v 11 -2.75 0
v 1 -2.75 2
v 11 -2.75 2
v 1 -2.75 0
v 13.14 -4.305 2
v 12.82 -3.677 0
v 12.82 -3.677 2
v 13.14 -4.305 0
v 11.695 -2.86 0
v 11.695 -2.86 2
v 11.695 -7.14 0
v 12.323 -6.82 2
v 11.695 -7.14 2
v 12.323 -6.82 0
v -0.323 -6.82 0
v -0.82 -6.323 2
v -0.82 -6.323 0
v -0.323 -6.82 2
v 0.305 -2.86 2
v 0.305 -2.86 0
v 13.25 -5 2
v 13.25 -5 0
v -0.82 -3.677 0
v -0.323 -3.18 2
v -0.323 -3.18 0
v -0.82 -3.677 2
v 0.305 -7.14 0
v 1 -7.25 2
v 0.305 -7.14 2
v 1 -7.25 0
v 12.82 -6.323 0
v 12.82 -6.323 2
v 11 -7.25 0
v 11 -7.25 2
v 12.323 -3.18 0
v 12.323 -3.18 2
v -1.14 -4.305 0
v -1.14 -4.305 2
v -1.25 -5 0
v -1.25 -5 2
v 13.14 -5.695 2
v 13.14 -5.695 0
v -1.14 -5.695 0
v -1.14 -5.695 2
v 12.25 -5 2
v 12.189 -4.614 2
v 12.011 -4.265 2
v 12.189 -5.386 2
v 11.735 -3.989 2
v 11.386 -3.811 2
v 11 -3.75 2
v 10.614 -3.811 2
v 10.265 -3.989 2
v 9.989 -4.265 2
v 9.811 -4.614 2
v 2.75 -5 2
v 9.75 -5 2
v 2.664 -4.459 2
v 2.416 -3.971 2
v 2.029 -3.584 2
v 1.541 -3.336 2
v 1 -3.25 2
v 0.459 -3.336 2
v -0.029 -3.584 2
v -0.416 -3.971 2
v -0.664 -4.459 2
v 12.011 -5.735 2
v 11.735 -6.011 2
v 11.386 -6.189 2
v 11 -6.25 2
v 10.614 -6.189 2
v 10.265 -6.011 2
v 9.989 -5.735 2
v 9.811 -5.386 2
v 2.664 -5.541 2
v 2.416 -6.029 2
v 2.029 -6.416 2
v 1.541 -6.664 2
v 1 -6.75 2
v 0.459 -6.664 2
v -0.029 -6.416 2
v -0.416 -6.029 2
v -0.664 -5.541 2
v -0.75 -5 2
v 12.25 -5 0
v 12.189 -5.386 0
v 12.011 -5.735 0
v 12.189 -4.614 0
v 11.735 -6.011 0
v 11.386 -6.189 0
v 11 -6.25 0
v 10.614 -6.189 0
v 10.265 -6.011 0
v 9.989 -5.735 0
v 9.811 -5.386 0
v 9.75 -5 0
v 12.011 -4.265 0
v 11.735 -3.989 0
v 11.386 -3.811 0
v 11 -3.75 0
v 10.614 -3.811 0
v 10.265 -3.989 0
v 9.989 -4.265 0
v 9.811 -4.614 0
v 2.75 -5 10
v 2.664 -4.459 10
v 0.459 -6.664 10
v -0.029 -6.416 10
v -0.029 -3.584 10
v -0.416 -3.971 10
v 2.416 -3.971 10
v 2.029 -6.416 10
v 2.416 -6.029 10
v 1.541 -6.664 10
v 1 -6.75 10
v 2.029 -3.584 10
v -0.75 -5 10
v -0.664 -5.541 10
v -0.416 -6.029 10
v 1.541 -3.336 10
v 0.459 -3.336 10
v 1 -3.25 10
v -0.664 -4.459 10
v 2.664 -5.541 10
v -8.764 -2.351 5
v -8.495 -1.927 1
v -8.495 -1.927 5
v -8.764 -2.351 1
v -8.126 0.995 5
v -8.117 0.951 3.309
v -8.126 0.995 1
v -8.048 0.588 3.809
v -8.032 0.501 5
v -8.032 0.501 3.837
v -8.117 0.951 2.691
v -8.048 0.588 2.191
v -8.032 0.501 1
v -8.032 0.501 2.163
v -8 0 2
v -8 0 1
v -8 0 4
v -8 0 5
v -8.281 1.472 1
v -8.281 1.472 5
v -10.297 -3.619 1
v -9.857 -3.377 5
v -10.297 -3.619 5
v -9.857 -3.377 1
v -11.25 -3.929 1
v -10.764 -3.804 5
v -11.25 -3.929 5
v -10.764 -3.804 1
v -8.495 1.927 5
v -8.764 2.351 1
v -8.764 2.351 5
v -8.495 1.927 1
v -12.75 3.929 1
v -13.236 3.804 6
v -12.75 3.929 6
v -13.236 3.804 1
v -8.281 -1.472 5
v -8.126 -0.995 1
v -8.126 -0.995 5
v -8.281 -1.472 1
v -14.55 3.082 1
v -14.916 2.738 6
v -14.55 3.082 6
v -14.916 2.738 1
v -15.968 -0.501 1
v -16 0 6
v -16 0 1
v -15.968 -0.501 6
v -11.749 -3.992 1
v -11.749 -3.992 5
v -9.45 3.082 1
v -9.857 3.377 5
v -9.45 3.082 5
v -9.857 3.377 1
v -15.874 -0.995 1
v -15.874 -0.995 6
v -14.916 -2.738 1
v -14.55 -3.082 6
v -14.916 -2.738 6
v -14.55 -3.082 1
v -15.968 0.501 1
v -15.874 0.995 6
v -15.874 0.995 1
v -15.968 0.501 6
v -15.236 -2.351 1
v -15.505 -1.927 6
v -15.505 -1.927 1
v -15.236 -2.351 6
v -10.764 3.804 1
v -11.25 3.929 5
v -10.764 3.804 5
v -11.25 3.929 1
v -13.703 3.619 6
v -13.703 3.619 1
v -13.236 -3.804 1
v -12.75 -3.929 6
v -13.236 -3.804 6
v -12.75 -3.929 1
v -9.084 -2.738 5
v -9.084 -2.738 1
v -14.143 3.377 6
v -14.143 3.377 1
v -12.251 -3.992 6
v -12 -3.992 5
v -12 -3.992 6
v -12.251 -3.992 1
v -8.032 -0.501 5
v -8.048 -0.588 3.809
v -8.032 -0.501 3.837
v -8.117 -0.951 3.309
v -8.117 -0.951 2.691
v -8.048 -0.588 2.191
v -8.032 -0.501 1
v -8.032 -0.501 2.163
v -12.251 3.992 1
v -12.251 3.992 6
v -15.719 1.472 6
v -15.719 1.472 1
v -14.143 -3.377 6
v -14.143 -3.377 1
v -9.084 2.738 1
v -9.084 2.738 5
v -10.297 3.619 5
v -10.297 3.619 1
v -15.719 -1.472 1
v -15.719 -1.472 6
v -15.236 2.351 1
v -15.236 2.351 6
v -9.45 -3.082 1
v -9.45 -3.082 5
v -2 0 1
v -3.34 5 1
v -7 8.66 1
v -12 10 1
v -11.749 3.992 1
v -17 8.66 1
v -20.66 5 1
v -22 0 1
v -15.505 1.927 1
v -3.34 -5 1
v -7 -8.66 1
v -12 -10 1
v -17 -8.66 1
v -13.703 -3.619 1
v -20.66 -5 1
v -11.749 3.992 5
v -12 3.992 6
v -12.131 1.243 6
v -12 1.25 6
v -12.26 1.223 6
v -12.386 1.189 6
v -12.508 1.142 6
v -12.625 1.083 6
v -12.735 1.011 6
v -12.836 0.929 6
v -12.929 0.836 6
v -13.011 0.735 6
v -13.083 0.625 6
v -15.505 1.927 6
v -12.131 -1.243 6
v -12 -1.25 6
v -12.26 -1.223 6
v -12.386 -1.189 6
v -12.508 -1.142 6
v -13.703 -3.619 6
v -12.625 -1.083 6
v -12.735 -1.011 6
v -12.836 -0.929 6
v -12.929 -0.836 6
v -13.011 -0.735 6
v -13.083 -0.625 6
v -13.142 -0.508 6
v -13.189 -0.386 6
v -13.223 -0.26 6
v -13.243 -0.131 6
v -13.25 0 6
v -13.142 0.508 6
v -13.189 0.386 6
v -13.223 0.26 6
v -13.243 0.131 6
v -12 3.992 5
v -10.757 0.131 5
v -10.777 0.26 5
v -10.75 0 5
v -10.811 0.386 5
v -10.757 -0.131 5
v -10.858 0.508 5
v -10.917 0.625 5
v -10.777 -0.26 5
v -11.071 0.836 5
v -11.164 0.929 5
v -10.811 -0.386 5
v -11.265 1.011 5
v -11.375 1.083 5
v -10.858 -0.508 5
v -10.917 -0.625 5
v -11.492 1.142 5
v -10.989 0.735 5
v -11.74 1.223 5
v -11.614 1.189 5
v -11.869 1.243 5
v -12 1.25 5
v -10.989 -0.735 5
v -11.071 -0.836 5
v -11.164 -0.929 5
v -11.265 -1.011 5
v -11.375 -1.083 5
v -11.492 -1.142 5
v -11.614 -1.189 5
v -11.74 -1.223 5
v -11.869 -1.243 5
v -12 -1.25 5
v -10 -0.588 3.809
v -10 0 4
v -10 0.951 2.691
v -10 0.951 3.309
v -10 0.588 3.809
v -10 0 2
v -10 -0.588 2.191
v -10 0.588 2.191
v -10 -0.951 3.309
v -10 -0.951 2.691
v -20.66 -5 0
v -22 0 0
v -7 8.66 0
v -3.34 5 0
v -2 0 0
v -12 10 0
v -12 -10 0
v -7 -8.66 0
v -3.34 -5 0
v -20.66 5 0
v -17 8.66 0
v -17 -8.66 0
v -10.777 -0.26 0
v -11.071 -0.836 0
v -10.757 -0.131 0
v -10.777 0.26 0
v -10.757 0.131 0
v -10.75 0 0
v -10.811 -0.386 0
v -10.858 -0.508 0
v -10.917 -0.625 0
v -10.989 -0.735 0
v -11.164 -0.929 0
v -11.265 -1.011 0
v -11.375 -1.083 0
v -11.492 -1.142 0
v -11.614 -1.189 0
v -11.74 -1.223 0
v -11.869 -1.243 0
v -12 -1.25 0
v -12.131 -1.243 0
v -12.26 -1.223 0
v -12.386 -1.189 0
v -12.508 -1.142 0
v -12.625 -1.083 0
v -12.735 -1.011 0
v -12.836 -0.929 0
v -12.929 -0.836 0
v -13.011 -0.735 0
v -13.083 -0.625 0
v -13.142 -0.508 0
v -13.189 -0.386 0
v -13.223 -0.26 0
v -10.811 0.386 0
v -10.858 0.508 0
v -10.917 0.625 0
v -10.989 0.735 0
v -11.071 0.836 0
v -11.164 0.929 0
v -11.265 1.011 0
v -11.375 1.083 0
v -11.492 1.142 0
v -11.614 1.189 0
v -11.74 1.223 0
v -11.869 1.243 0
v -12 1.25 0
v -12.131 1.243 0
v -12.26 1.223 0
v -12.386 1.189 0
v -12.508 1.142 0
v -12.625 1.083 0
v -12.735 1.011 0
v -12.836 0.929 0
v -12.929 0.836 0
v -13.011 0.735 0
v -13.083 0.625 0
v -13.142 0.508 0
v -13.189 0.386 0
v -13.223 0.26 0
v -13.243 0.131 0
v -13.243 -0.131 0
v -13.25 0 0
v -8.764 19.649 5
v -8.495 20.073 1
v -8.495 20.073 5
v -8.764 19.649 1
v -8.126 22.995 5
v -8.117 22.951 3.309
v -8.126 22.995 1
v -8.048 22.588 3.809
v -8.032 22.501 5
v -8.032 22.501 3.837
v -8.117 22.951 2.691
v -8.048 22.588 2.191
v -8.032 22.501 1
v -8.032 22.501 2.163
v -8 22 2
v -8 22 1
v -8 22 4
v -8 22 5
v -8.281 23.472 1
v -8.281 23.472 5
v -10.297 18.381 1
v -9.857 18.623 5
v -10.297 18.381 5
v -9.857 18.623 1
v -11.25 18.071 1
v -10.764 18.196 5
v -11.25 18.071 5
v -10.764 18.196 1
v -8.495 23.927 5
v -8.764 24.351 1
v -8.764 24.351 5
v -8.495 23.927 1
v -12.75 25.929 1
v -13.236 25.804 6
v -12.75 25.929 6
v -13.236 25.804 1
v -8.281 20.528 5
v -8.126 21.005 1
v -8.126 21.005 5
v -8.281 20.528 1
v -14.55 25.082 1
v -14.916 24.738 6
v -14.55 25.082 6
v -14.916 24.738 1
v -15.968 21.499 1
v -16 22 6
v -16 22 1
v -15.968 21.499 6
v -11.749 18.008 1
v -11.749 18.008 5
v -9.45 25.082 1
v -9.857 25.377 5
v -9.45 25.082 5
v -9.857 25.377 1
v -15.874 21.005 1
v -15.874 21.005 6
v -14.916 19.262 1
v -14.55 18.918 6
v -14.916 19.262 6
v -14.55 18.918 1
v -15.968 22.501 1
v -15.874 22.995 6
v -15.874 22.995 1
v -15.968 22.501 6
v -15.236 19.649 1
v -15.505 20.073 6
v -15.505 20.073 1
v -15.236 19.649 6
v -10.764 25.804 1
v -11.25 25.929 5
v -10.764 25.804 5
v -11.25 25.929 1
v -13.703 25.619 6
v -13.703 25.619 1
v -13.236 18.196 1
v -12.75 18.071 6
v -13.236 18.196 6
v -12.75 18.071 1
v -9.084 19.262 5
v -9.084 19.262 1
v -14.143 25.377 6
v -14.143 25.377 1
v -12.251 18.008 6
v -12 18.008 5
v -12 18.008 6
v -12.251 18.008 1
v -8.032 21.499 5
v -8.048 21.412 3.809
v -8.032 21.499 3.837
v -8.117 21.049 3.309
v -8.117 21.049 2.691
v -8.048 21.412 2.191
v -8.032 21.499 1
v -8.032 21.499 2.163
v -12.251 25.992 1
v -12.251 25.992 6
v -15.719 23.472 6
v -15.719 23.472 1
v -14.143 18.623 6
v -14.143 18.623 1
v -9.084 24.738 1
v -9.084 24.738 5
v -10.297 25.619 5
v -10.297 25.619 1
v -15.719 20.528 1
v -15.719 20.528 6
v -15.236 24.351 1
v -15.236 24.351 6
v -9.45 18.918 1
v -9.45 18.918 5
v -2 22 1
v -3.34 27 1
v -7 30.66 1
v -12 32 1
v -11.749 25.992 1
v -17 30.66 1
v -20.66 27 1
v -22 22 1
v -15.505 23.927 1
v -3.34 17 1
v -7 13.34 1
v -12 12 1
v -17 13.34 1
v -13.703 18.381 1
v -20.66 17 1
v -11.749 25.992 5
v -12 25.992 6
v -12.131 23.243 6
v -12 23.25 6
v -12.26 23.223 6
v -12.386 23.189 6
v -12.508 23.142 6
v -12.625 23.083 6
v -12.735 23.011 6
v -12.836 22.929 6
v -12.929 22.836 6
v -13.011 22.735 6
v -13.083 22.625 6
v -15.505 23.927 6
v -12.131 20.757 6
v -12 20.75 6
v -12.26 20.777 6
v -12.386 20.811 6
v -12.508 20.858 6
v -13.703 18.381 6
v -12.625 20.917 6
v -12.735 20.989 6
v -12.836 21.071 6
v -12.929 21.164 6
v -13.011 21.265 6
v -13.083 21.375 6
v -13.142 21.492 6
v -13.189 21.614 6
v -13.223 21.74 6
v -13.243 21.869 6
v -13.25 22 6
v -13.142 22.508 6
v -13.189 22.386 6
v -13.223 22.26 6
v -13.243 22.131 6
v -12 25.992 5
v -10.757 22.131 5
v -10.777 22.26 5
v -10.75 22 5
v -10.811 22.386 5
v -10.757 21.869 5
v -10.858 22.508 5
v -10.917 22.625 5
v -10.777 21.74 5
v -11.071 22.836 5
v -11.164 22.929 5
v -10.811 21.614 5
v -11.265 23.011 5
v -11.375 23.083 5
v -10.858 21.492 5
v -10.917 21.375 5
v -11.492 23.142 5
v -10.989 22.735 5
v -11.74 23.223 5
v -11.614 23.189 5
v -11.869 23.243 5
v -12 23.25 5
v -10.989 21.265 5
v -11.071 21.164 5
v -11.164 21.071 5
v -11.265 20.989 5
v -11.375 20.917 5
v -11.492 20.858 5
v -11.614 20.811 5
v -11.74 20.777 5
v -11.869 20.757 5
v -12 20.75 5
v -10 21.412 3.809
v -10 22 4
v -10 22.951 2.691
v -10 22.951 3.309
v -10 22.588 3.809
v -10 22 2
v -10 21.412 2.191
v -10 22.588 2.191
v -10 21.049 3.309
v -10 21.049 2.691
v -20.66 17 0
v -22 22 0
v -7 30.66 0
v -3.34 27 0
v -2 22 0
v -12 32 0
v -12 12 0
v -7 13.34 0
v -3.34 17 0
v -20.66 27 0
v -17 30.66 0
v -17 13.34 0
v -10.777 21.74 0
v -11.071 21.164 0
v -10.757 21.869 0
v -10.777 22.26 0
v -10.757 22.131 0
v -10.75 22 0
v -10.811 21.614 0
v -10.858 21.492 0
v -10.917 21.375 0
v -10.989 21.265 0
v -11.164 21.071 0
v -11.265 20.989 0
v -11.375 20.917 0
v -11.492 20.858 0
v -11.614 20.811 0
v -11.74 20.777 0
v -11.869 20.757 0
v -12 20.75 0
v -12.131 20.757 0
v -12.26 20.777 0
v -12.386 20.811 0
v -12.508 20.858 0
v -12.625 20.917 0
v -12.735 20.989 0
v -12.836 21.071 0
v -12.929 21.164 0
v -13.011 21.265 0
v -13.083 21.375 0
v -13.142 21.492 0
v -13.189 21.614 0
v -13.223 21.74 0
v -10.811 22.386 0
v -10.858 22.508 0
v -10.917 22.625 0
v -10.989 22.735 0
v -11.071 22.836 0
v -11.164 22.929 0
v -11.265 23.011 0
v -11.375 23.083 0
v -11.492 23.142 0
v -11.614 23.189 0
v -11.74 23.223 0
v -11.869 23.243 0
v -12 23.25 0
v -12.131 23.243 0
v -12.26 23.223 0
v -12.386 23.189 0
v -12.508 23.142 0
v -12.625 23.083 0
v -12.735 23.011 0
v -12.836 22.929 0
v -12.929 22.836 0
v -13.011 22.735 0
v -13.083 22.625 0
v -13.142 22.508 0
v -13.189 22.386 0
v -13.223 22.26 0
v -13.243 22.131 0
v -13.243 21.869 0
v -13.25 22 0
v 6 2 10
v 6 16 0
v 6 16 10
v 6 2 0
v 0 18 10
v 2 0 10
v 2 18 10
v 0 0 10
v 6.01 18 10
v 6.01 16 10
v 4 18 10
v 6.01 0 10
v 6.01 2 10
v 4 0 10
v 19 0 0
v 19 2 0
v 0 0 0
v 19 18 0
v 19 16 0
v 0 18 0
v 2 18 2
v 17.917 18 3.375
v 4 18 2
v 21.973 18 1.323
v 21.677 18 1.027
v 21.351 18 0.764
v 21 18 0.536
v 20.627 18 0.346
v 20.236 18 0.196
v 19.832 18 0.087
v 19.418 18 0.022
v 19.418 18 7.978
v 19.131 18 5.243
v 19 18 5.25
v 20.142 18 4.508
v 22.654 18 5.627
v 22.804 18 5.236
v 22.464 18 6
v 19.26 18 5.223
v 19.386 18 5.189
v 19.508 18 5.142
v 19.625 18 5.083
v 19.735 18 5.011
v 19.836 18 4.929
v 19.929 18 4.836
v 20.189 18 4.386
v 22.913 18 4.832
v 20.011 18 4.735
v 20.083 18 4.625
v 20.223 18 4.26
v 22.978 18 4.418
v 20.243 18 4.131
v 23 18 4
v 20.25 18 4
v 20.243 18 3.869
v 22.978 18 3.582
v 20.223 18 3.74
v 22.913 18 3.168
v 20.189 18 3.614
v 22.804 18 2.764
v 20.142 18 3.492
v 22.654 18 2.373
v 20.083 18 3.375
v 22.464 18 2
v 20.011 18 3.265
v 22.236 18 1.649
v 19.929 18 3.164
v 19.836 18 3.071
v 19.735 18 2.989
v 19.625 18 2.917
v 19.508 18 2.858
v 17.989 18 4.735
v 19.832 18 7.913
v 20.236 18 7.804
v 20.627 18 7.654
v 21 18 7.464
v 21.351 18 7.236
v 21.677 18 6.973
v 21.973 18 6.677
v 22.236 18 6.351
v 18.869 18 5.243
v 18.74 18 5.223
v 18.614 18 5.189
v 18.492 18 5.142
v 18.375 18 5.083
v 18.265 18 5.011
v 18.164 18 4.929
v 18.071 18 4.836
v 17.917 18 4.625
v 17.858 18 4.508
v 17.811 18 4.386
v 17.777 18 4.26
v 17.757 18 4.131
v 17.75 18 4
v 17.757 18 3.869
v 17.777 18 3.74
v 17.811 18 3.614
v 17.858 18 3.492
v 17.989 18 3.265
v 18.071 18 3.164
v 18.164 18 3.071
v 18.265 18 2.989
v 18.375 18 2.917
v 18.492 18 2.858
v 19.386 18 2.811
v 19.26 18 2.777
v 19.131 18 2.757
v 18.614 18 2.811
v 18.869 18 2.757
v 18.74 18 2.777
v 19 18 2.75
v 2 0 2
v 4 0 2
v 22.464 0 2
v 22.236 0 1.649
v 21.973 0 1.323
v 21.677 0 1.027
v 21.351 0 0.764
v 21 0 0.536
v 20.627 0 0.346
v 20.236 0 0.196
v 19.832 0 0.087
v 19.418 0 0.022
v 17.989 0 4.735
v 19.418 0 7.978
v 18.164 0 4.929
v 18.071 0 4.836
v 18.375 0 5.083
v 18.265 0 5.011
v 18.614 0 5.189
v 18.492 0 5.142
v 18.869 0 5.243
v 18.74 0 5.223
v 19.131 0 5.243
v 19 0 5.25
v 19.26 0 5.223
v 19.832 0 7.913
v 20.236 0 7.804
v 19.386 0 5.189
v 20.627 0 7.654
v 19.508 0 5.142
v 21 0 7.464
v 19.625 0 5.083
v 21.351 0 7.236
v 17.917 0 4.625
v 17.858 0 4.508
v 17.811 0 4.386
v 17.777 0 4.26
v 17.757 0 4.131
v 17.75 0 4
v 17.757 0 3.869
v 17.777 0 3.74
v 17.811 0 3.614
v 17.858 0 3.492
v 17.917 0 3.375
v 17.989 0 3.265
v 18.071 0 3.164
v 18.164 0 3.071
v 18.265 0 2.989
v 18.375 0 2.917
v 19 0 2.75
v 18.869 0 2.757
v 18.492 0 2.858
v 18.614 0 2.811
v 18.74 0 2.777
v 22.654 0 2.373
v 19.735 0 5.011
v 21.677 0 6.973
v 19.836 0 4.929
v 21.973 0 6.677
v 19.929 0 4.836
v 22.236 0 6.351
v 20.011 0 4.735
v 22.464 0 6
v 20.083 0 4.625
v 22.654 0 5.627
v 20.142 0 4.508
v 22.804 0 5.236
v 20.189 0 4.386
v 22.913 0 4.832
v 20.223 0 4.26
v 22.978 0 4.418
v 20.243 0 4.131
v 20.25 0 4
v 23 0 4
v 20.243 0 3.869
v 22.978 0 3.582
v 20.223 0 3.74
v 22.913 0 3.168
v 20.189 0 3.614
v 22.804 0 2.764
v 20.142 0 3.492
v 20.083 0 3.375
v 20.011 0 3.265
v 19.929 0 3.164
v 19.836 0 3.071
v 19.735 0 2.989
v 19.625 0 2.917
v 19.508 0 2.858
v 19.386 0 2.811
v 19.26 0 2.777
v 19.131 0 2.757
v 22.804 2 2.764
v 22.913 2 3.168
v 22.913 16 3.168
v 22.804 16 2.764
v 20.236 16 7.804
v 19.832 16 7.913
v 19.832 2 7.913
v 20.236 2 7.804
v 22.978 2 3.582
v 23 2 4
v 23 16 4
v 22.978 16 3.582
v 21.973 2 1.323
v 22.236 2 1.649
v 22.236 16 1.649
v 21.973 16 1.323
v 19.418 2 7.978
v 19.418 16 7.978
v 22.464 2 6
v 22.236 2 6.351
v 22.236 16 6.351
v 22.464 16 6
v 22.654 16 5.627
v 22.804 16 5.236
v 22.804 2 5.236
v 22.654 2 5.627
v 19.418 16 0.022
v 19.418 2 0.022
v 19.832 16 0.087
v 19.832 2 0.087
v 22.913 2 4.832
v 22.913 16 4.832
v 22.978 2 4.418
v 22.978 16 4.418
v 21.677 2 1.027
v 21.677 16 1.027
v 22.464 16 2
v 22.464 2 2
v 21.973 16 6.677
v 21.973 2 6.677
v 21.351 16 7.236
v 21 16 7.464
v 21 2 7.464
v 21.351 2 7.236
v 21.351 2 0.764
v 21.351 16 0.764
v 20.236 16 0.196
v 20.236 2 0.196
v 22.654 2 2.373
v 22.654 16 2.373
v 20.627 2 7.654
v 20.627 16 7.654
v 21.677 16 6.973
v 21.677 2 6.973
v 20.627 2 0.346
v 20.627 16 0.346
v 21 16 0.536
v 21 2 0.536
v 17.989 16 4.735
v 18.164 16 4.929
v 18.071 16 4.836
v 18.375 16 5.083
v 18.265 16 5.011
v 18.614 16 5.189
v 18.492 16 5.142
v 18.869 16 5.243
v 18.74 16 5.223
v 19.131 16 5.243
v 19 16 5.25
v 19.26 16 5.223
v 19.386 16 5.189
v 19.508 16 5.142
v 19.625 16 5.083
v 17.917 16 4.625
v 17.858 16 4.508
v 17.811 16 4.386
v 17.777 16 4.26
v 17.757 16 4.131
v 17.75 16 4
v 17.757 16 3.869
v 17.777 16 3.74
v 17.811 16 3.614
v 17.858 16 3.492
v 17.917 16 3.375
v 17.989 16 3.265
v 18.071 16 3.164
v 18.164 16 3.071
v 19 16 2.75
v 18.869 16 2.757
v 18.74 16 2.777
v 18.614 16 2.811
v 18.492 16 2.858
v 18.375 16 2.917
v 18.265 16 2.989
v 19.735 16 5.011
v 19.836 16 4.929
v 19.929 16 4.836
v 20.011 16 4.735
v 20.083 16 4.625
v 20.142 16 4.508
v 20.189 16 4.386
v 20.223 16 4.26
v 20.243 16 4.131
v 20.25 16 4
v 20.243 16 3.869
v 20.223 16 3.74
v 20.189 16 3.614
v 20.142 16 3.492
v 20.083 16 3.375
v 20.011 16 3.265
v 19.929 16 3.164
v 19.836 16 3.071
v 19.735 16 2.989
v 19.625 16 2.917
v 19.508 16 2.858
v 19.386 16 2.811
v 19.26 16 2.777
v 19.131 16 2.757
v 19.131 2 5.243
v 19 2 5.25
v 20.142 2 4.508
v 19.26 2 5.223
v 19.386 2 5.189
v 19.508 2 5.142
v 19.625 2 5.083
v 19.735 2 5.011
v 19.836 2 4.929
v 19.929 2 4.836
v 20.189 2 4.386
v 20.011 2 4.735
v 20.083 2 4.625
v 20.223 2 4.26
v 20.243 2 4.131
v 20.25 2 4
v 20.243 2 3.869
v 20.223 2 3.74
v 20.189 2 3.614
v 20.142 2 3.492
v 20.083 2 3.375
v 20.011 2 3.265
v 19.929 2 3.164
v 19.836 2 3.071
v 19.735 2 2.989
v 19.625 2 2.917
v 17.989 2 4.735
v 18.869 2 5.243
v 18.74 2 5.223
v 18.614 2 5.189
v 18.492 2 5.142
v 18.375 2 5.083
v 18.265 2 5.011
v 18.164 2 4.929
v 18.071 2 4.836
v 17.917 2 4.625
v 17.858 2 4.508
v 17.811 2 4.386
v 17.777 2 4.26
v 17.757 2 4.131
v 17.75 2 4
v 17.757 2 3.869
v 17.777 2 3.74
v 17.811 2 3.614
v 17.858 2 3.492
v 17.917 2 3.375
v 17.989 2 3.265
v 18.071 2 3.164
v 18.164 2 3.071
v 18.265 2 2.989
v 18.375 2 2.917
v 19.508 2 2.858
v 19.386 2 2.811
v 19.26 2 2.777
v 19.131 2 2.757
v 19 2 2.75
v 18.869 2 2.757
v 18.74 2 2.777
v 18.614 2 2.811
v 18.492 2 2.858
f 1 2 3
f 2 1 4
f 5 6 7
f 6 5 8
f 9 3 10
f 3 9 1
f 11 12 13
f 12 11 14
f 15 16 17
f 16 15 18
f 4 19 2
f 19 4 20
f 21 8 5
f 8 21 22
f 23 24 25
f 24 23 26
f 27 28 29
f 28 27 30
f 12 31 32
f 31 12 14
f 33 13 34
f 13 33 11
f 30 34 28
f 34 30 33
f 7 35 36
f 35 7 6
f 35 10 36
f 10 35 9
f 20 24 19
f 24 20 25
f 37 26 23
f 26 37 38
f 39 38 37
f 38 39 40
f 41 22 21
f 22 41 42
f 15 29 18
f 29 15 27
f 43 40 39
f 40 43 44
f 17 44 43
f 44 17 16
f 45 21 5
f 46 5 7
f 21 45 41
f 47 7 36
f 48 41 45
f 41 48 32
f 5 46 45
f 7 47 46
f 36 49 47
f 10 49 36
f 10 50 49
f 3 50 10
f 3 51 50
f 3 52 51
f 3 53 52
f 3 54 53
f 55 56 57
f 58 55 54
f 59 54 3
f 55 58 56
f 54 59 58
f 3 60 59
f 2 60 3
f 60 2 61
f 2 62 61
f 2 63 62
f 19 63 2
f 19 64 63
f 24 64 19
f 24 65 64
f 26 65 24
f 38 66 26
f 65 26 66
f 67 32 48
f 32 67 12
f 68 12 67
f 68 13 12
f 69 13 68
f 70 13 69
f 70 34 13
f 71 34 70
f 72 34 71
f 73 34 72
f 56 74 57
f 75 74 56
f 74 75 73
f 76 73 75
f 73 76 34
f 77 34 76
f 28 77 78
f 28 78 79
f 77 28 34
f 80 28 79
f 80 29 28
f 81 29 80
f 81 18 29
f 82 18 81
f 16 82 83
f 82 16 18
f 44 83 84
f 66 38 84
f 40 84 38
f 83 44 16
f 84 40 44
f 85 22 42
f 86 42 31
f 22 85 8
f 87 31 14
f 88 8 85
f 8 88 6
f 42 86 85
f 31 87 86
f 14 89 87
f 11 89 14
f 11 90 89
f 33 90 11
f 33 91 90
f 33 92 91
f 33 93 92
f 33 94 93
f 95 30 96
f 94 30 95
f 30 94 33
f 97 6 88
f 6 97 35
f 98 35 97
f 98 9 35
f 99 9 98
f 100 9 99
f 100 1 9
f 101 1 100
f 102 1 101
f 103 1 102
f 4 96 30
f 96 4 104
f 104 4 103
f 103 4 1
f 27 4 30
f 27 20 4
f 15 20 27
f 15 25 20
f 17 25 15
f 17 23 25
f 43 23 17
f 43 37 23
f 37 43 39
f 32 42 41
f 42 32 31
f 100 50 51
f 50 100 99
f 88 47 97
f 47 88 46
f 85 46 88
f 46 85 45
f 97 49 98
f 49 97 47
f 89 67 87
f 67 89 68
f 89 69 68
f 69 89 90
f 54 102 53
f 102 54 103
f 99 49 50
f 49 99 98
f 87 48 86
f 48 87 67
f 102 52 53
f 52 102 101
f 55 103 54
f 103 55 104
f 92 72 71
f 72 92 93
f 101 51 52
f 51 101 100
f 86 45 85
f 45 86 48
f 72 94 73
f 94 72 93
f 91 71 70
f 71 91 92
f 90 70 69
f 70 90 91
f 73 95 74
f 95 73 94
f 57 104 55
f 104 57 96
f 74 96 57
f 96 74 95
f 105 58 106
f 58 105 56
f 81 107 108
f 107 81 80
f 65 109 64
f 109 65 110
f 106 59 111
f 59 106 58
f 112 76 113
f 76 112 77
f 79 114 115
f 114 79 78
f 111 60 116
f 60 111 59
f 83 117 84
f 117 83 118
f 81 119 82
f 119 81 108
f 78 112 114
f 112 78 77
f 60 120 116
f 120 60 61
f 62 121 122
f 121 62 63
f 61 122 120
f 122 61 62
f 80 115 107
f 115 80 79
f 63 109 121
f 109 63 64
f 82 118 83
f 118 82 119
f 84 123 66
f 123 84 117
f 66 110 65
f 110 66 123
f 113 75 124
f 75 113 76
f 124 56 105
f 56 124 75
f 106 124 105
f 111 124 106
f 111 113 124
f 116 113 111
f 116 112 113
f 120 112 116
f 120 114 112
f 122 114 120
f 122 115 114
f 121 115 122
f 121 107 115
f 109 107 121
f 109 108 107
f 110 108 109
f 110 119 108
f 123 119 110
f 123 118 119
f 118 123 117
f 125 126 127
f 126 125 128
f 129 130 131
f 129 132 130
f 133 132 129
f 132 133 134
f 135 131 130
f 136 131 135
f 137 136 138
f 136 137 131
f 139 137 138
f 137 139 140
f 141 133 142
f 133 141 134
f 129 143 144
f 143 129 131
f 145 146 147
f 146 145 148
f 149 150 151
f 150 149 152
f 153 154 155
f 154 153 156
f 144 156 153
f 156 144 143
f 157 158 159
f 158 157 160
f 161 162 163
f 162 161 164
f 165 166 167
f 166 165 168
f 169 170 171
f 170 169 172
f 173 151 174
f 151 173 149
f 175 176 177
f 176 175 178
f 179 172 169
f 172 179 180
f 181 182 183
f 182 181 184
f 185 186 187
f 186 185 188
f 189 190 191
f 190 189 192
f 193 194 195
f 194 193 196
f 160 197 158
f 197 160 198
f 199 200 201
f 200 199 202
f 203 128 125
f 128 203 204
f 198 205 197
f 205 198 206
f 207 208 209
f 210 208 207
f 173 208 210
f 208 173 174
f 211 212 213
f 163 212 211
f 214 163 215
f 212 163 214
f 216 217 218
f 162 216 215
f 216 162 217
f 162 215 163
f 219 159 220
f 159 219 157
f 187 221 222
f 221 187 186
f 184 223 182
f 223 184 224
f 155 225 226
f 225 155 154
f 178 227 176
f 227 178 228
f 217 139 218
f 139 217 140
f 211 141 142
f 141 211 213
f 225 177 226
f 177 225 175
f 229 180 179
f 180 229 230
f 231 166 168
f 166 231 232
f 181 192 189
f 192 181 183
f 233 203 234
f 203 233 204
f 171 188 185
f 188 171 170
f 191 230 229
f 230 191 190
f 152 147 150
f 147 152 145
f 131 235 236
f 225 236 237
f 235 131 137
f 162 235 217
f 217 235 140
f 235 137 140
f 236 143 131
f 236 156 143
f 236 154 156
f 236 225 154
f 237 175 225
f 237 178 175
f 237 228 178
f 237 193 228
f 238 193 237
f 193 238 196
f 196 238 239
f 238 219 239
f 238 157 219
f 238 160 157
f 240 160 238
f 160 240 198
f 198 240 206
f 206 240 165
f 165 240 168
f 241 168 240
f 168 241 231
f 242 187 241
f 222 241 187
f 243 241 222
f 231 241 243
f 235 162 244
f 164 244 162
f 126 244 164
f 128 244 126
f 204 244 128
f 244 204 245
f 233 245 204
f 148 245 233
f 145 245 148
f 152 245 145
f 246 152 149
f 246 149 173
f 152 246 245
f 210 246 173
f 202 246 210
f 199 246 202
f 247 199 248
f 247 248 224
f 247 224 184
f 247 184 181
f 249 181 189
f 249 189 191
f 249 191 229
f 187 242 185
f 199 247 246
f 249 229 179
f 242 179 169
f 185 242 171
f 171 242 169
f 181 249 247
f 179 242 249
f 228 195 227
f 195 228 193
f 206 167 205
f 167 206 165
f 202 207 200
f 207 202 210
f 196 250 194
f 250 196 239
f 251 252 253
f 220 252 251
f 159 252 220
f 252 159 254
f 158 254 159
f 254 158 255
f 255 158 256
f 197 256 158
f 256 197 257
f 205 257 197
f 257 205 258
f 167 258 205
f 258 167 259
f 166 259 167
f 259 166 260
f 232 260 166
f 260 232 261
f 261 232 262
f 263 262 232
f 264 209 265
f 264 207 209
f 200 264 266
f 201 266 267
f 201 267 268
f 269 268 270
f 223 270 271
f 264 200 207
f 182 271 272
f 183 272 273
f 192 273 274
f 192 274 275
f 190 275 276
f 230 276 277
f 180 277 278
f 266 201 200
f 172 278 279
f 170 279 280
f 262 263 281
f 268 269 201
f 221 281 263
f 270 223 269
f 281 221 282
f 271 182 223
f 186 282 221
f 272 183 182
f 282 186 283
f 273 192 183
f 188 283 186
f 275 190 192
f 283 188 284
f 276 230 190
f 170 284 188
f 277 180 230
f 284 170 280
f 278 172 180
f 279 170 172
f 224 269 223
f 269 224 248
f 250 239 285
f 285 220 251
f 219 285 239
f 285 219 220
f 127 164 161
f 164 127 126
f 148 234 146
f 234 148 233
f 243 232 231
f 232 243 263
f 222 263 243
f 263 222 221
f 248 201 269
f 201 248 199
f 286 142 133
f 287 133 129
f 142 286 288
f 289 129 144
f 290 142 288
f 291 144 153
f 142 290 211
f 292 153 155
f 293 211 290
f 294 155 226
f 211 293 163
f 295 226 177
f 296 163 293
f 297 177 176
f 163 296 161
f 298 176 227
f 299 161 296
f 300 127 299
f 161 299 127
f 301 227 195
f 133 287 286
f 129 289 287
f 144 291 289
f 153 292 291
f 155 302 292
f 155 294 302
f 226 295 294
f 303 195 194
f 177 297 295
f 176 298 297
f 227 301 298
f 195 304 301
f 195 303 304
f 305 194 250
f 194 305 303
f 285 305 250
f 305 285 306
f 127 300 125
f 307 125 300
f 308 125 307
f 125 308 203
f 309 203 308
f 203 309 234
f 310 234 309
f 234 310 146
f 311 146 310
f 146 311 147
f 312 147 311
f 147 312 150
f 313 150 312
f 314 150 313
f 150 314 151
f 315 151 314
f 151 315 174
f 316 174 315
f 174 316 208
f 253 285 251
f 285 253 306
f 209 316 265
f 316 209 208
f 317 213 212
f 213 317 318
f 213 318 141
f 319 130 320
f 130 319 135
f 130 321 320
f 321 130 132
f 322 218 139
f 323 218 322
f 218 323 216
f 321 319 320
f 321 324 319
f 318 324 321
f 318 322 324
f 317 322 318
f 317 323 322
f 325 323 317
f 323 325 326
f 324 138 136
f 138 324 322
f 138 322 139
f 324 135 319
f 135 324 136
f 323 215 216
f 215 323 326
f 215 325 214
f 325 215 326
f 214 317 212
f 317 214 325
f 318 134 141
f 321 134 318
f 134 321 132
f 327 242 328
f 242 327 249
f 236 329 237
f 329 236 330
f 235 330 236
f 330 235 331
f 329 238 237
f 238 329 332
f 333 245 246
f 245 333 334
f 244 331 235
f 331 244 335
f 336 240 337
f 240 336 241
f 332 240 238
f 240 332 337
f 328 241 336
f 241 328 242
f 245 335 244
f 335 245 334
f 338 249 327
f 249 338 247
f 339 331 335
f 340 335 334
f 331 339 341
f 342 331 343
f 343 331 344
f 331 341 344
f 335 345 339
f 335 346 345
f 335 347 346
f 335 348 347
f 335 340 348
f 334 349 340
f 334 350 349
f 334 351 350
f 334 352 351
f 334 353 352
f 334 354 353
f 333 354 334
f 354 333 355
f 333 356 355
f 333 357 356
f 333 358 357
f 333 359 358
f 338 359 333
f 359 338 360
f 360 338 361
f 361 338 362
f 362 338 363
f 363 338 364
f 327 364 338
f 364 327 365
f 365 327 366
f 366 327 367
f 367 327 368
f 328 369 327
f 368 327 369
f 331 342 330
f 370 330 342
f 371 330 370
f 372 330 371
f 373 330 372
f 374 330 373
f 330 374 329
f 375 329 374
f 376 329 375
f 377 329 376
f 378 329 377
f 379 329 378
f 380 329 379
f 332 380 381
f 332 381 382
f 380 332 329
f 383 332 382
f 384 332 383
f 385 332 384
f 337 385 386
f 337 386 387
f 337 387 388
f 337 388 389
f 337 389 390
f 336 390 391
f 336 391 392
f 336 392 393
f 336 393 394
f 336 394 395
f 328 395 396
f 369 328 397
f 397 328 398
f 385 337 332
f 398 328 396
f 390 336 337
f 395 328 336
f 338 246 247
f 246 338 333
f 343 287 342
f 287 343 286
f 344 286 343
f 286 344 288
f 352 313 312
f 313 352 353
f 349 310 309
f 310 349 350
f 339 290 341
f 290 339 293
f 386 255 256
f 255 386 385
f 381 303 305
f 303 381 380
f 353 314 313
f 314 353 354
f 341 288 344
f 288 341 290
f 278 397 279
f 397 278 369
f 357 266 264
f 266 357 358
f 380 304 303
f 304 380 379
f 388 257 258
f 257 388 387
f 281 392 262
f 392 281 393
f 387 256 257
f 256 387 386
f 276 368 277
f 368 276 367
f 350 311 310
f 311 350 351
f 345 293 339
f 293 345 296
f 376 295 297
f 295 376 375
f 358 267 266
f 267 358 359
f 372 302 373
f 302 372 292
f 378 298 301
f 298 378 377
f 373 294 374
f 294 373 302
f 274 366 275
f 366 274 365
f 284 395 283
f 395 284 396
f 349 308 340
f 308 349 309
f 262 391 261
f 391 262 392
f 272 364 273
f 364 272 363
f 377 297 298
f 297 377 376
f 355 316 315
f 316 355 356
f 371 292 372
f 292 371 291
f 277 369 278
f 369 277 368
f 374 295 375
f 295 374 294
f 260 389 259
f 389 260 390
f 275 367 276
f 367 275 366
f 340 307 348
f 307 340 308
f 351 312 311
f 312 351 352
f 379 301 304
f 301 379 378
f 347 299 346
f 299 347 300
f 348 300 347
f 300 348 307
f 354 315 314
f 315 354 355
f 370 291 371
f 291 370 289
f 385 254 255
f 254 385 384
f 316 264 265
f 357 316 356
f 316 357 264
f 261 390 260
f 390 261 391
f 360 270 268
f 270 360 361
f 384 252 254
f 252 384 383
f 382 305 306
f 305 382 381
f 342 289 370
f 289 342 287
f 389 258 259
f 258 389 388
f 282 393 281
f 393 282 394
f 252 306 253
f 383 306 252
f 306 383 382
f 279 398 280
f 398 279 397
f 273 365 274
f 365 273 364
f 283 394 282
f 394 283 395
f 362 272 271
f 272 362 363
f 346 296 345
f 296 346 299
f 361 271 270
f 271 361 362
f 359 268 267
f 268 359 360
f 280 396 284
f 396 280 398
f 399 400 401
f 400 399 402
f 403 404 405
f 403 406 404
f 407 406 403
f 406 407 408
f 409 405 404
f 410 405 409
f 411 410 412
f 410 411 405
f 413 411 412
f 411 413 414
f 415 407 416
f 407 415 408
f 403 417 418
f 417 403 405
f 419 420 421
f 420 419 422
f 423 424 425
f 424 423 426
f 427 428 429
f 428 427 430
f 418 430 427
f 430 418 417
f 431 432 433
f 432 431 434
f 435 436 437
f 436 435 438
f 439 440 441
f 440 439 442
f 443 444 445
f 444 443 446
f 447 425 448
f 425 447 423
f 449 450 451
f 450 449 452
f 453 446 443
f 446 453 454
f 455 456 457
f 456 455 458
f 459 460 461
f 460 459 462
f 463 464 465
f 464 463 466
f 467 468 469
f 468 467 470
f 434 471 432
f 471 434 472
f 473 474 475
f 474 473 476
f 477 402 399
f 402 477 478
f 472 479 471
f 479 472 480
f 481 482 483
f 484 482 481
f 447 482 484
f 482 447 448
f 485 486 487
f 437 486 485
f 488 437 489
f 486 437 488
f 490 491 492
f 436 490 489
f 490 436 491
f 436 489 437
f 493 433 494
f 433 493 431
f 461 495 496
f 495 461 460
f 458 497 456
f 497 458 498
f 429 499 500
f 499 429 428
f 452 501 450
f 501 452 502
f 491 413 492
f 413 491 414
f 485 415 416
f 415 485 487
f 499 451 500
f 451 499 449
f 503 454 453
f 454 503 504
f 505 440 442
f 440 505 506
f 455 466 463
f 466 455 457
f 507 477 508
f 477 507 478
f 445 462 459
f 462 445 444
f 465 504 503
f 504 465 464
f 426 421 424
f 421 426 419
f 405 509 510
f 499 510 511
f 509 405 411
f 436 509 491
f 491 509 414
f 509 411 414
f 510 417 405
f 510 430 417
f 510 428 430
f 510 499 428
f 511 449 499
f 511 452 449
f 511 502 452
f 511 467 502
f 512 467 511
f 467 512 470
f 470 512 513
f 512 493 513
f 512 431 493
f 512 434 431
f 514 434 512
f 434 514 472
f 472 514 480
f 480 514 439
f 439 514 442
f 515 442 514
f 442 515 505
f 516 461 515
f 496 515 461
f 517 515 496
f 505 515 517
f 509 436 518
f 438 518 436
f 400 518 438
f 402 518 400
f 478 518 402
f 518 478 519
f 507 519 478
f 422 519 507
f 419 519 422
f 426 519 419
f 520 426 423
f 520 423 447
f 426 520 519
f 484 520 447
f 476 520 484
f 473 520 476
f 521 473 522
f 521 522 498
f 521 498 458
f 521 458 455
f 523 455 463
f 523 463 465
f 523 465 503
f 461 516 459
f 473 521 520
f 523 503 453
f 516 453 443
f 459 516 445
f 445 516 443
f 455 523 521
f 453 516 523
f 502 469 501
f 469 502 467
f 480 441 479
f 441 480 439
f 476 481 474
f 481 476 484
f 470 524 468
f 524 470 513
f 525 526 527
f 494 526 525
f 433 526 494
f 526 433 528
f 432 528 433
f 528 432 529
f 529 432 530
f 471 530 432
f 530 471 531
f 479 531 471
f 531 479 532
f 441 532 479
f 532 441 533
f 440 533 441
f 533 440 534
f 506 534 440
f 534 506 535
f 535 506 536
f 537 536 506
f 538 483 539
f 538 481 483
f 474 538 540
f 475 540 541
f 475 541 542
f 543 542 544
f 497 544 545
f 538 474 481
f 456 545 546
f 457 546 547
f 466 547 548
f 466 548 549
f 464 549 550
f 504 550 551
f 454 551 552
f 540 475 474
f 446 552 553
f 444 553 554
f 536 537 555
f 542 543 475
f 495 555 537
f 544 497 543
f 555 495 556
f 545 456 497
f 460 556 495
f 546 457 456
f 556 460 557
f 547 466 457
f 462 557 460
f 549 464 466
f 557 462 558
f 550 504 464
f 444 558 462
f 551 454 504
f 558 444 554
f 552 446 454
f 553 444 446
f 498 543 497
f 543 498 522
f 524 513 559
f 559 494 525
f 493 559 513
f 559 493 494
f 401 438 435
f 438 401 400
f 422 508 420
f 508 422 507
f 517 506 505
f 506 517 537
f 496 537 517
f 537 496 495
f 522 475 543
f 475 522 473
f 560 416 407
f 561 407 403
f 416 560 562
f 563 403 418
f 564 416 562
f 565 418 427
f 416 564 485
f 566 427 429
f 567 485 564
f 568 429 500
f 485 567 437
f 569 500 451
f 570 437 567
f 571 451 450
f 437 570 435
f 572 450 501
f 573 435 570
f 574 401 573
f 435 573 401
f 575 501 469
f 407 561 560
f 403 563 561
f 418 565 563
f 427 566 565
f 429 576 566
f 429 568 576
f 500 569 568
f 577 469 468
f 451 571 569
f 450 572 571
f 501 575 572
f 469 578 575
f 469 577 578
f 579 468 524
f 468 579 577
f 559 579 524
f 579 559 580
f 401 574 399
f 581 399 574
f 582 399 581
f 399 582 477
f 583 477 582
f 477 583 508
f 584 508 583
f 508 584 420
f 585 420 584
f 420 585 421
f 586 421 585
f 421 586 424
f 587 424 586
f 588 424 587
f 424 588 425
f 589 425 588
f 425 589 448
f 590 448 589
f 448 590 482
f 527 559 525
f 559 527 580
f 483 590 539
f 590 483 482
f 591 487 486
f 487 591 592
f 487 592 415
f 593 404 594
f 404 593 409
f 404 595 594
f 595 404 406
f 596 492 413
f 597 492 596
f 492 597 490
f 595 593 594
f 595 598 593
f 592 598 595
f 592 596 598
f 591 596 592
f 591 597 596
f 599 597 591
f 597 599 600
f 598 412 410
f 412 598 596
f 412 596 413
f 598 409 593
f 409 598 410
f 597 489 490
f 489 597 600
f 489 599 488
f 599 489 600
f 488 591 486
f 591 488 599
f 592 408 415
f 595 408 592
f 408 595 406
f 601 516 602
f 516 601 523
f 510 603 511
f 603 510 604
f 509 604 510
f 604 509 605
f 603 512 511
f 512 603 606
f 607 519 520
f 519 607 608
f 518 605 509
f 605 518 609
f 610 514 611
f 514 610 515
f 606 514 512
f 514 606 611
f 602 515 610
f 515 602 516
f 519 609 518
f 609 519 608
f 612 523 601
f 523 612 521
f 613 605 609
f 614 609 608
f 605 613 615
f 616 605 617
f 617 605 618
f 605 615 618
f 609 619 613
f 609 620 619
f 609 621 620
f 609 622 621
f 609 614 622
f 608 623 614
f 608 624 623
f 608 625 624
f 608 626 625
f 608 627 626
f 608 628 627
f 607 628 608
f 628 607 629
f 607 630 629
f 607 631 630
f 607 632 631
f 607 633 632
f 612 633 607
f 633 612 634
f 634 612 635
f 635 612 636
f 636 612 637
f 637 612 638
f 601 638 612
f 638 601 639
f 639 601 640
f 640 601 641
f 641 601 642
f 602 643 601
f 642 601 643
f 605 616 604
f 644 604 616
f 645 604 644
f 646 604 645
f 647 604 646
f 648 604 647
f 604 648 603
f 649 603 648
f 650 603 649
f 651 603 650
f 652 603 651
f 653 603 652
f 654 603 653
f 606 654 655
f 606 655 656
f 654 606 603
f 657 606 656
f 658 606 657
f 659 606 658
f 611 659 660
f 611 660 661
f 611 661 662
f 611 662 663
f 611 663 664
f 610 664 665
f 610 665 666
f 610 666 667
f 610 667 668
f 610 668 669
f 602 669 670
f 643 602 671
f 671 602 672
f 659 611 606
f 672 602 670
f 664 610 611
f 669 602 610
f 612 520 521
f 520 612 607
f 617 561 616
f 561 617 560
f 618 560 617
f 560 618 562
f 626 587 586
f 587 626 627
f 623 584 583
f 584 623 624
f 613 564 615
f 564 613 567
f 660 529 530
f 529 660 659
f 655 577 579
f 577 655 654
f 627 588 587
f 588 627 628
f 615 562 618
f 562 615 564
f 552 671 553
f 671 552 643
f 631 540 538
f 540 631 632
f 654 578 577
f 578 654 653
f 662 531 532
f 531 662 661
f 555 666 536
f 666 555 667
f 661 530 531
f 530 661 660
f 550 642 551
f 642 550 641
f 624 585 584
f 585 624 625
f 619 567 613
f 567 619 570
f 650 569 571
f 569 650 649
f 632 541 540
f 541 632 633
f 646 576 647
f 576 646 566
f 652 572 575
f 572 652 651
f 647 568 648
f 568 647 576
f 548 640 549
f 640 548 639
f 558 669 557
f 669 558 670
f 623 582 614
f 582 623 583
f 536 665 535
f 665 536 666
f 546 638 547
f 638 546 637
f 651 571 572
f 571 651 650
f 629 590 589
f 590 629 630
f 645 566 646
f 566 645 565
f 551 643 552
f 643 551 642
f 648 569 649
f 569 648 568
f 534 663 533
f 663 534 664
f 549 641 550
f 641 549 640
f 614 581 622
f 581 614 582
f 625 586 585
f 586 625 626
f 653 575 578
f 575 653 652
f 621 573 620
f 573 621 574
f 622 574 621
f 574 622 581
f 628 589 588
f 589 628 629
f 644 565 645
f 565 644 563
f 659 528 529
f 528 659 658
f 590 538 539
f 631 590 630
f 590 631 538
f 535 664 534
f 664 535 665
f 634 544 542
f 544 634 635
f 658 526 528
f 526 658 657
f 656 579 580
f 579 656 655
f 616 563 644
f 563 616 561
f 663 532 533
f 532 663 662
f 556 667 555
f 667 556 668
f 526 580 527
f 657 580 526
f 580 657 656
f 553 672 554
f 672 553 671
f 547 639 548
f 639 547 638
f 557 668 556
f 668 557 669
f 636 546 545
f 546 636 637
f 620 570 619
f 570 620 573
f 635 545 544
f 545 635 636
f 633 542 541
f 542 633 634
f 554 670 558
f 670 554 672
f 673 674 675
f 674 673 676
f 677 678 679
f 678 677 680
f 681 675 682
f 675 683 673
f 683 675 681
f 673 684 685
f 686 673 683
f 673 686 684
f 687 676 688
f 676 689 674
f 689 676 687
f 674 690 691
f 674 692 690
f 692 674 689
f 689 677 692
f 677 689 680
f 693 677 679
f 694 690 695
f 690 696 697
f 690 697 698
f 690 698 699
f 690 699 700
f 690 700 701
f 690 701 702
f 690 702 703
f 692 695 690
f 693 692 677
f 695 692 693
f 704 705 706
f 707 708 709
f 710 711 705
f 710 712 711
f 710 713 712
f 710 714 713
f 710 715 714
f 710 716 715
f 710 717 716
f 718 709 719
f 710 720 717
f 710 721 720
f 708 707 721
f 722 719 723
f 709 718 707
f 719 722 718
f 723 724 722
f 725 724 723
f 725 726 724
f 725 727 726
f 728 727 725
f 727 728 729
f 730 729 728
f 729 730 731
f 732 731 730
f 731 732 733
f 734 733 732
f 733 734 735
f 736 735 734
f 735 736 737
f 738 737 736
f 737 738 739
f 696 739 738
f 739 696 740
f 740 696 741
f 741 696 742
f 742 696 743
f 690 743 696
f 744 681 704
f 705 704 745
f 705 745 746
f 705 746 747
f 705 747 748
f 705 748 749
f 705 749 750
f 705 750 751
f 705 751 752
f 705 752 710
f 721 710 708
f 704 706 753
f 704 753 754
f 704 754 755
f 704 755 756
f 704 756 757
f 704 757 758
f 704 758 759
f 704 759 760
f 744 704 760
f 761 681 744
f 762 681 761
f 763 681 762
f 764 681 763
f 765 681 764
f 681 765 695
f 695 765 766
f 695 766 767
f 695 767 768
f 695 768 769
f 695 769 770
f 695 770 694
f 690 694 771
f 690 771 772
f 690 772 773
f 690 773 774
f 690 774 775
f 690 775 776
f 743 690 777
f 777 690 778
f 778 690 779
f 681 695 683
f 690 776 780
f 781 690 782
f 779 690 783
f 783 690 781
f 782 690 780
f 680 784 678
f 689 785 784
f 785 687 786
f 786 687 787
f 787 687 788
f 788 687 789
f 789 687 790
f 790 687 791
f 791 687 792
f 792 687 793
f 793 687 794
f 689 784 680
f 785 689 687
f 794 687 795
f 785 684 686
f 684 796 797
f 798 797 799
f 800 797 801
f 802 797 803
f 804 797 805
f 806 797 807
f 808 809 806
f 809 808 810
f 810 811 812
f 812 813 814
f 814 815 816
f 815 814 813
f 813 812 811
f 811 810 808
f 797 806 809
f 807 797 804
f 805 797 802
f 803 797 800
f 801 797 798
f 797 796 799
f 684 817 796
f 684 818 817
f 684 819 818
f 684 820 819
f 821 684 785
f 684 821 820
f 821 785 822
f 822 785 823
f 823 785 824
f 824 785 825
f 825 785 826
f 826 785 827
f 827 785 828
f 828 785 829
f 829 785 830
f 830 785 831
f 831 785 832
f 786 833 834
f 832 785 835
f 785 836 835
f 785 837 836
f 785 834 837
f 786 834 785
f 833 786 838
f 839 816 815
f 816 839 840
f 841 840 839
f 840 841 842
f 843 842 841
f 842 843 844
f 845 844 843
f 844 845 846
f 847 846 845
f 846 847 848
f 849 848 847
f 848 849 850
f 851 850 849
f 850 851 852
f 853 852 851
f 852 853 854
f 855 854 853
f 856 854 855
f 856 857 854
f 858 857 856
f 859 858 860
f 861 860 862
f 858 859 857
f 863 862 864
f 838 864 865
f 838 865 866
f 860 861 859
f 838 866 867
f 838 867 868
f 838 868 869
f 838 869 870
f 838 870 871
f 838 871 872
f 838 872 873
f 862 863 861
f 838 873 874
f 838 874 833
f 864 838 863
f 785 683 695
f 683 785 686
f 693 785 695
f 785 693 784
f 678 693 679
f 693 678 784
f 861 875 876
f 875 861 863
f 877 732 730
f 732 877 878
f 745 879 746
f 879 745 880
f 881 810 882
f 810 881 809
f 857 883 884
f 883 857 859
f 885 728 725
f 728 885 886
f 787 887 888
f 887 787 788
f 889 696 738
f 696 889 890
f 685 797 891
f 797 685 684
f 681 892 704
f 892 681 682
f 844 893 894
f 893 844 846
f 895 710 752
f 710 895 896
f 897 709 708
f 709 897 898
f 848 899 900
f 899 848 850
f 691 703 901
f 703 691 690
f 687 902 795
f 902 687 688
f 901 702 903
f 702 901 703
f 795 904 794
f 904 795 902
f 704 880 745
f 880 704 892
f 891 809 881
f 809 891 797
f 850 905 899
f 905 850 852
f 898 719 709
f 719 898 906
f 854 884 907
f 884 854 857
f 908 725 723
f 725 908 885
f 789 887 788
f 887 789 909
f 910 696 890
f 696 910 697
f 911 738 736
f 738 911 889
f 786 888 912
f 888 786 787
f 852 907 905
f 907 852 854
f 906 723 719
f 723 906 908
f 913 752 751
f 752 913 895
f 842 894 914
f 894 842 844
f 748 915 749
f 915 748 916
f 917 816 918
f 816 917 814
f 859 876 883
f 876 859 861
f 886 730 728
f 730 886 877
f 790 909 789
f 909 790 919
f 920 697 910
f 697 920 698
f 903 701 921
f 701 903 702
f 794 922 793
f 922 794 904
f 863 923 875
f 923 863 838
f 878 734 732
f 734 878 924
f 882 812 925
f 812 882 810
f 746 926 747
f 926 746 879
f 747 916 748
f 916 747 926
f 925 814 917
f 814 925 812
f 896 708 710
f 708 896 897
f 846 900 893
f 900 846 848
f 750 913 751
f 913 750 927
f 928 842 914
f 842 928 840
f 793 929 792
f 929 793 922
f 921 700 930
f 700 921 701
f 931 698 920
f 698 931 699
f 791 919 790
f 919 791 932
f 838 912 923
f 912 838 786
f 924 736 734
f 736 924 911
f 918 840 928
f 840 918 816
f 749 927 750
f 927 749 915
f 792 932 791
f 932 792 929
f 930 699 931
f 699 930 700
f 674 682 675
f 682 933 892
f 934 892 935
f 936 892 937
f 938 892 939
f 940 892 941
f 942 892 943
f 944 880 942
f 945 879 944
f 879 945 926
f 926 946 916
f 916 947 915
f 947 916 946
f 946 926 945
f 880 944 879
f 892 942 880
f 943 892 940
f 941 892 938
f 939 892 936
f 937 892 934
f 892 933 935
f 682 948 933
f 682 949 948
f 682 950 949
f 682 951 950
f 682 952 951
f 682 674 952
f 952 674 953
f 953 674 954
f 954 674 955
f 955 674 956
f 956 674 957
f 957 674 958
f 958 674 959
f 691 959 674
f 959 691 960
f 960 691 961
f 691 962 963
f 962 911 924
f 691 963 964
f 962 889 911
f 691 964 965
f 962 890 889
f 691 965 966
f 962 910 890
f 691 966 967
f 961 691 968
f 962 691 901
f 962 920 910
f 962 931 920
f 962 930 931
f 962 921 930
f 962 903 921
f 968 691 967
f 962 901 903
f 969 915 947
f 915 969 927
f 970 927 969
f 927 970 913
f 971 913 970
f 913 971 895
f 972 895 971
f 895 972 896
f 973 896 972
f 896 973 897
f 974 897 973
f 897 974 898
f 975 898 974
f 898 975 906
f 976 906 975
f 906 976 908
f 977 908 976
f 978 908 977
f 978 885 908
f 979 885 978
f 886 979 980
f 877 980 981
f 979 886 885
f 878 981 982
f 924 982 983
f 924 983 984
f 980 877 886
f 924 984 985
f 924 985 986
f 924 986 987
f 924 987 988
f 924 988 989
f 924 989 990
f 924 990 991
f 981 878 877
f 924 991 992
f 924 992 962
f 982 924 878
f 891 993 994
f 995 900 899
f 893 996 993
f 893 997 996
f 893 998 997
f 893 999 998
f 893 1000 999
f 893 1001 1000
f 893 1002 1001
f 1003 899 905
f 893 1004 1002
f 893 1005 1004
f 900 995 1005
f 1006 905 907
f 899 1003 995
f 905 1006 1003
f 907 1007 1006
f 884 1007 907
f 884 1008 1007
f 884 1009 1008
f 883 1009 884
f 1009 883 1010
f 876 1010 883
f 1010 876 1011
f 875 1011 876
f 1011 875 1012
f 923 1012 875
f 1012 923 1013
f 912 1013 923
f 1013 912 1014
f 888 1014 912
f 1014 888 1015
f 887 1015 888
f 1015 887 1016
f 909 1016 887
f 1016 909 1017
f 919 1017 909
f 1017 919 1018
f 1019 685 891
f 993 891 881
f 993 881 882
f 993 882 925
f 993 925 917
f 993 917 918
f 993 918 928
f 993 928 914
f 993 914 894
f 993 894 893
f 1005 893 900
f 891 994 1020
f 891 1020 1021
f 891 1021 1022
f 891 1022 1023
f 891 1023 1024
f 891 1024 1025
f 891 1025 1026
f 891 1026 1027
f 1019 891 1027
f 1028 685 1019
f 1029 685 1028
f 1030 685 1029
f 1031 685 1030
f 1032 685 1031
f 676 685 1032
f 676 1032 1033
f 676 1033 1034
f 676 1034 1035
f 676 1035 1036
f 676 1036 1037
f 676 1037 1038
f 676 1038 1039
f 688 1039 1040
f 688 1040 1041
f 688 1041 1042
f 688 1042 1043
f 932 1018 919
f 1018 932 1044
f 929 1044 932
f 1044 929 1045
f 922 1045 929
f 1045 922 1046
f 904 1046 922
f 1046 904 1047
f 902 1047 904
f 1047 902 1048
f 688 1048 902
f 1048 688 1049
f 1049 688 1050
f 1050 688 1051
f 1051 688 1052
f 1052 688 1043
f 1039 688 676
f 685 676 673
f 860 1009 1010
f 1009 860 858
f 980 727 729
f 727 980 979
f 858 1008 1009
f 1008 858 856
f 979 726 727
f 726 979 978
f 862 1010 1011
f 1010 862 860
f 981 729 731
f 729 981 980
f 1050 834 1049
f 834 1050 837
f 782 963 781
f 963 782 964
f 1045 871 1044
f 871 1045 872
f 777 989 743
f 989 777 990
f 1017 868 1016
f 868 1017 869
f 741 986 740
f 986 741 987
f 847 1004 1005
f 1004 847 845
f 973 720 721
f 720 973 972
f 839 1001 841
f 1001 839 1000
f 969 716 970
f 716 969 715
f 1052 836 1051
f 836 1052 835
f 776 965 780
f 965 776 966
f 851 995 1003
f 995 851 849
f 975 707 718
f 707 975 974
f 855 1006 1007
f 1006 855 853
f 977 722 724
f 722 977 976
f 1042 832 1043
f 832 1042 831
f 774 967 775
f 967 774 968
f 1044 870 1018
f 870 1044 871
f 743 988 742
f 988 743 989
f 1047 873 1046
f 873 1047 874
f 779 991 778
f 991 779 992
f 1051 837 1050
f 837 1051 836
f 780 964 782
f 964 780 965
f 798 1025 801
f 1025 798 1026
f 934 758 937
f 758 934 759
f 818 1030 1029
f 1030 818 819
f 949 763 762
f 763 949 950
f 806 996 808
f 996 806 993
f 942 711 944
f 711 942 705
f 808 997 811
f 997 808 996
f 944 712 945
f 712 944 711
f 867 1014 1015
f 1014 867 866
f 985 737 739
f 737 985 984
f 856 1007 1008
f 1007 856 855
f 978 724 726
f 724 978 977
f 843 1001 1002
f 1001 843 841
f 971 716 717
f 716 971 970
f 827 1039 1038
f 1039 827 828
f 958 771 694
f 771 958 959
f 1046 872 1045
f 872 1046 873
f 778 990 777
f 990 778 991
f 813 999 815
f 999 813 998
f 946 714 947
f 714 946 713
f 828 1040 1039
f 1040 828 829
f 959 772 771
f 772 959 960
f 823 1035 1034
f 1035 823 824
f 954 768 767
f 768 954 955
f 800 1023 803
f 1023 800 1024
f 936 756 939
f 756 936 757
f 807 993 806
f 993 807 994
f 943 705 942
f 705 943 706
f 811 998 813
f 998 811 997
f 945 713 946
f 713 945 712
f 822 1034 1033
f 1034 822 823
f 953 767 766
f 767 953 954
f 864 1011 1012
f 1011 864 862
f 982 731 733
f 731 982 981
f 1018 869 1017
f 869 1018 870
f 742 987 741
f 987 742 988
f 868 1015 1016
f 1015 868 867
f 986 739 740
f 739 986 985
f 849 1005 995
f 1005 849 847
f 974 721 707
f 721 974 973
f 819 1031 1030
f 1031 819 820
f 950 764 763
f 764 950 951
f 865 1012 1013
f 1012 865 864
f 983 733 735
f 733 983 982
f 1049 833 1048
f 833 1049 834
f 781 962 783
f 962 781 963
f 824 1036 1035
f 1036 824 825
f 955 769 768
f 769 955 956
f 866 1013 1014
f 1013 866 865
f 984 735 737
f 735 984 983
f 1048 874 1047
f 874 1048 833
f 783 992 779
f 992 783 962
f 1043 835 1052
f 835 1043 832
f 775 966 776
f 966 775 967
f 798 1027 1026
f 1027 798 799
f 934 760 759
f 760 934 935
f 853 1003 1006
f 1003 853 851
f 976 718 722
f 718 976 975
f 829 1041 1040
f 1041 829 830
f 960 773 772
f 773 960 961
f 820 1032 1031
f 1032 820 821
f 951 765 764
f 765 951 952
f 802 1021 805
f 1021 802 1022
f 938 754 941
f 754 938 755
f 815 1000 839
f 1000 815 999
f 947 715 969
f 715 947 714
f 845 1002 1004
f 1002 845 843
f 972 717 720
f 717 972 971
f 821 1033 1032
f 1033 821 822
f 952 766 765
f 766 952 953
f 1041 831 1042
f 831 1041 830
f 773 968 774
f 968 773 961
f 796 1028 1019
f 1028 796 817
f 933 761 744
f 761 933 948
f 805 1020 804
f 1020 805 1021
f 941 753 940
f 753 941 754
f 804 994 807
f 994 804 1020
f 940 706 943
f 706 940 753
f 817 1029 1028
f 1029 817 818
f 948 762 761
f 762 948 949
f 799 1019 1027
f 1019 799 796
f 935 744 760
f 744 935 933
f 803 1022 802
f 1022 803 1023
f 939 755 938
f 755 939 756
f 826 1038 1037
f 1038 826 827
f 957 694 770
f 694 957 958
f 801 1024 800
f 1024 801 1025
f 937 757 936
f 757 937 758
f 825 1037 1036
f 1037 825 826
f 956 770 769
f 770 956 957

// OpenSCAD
eps=0.01;


module roller_main()
{
  difference()
  {
    // core part
    union()
    {
      cylinder(d=20, h=1, $fn=12);
      translate([0, 0, 1])
      {
        // internal roller part
        difference()
        {
          cylinder(d=8, h=10/2, $fn=50);
          translate([0, -10, 10/2-1])
            cube([10, 20, 10]);
          // cut in for string
          translate([2, 0, 2])
            rotate([0, 90, 0])
              cylinder(d=2, h=2, $fn=10);
        }
      }
    }
    // main shaft
    translate([0,0,-1])
      cylinder(d=2.5, h=20, $fn=60);
  }
}


module holder()
{
  wall=2;
  width=12+2*1+2*wall;
  // main bulwark mount
  difference()
  {
    cube([2+2*wall, width, 8+wall]);
    translate([wall, -eps, wall])
      cube([2, width+2*eps, 8+wall]);
  }
  // roller mount
  translate([2+2*wall, 0, 0])
  {
    difference()
    {
      // core
      hull()
      {
        cube([eps, width, 8+wall]);
        translate([13, 0, 8/2])
          rotate([-90, 0, 0])
            cylinder(d=8, h=width, $fn=60);
      }
      // cut-in
      translate([0, wall, -eps])
        cube([20, width-2*wall, 15]);
      // shaft
      translate([13, -eps, 8/2])
        rotate([-90, 0, 0])
          cylinder(d=2.5, h=width+2*eps, $fn=60);
    }
  }
}


module crank()
{
  d=2.5+2*1;
  difference()
  {
    dx_max = 10;
    hull()
      for(dx=[0, dx_max])
        translate([dx, 0, 0])
          cylinder(d=d, h=2, $fn=20);
    translate([dx_max, 0, -eps])
      cylinder(d=2.5, h=2+2*eps, $fn=20);
  }
  cylinder(d=d-1, h=2+8, $fn=20);
}


translate([1, -5, 0])
  crank();

for(i=[0,1])
  translate([-12, i*22, 0])
    roller_main();

holder();

%if(true)
  translate([19, 2+3/2, 8/2])
    rotate([-90, 0, 0])
      union()
      {
        roller_main();
        rotate([0, 0, 180])
          translate([0, 0, 11])
            rotate([180, 0, 0])
              roller_main();
      }
